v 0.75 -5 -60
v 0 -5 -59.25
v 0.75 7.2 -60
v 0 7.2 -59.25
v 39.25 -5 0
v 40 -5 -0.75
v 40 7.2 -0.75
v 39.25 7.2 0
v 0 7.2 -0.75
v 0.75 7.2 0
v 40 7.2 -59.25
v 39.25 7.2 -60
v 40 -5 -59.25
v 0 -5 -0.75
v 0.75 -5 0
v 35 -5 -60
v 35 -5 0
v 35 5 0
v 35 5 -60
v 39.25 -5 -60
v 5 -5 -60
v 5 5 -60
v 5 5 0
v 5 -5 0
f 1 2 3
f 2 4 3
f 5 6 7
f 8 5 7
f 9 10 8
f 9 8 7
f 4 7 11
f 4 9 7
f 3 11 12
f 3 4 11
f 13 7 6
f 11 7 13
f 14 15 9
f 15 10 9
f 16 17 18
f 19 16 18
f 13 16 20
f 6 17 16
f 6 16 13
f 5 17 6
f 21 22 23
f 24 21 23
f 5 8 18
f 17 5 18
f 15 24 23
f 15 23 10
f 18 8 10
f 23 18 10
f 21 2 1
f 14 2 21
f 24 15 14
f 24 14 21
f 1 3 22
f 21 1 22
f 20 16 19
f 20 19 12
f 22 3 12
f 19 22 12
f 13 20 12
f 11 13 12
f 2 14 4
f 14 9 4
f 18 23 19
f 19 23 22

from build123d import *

# Parameters (mm, degrees)
SCHIZZO1_W                        = 60
SCHIZZO1_H                        = 7.2
SCHIZZO1_W_2                      = 19.125
SCHIZZO1_H_2                      = 5
ESTRUSIONE_ESTRUSIONE1_DEPTH      = 40
SCHIZZO2_W                        = 11.375
SCHIZZO2_H                        = 5
SCHIZZO2_W_2                      = 2.075
SCHIZZO2_H_2                      = 1.1
SCHIZZO2_W_3                      = 2.05
TAGLIO_ESTRUSIONE1_DEPTH          = 61
SMUSSO1_SIZE                      = 0.75
SCHIZZO3_W                        = 7.25
SCHIZZO3_H                        = 5
TAGLIO_ESTRUSIONE2_DEPTH          = 64
SCHIZZO4_W                        = 38.5
SCHIZZO4_H                        = 1.1
ESTRUSIONE_ESTRUSIONE3_DEPTH      = 60
SCHIZZO7_W                        = 30
SCHIZZO7_H                        = 1.1
ESTRUSIONE_ESTRUSIONE4_DEPTH      = 50
ESTRUSIONE_ESTRUSIONE5_DEPTH      = 5
SCHIZZO9_W                        = 19.125
SCHIZZO9_H                        = 1.1
ESTRUSIONE_ESTRUSIONE6_DEPTH      = 5
ESTRUSIONE_ESTRUSIONE6_DEPTH_BACK = 35
SCHIZZO10_W                       = 19.125
SCHIZZO10_H                       = 3.9
TAGLIO_ESTRUSIONE3_DEPTH          = 41
SCHIZZO11_W                       = 19.125
SCHIZZO11_H                       = 7.8
ESTRUSIONE_ESTRUSIONE7_DEPTH      = 40
SCHIZZO12_W                       = 30
SCHIZZO12_H                       = 10
TAGLIO_ESTRUSIONE4_DEPTH          = 64


with BuildPart() as part:
    # Schizzo1 → Estrusione-Estrusione1 (new body)
    with BuildSketch(Plane(origin=(0, 0, 0), x_dir=(0, 0, -1), z_dir=(1, 0, 0))):
        with Locations((30, 3.6)):
            Rectangle(SCHIZZO1_W, SCHIZZO1_H)
        with Locations((43.1875, 3.6)):
            Rectangle(SCHIZZO1_W_2, SCHIZZO1_H_2, mode=Mode.SUBTRACT)
        with Locations((16.8125, 3.6)):
            Rectangle(SCHIZZO1_W_2, SCHIZZO1_H_2, mode=Mode.SUBTRACT)
    extrude(amount=ESTRUSIONE_ESTRUSIONE1_DEPTH)

    # Schizzo2 → Taglio-Estrusione1 (cut, through all)
    with BuildSketch(Plane.XY):
        with Locations((10.6875, 2.5)):
            Rectangle(SCHIZZO2_W, SCHIZZO2_H)
        with Locations((29.3125, 2.5)):
            Rectangle(SCHIZZO2_W, SCHIZZO2_H)
        with Locations((15.3375, 6.65)):
            Rectangle(SCHIZZO2_W_2, SCHIZZO2_H_2)
        with Locations((8.275, 6.65)):
            Rectangle(SCHIZZO2_W_3, SCHIZZO2_H_2)
        with Locations((24.6625, 6.65)):
            Rectangle(SCHIZZO2_W_2, SCHIZZO2_H_2)
        with Locations((31.725, 6.65)):
            Rectangle(SCHIZZO2_W_3, SCHIZZO2_H_2)
    extrude(amount=-TAGLIO_ESTRUSIONE1_DEPTH, mode=Mode.SUBTRACT)

    # Smusso1
    smusso1_edges = [part.edges().sort_by_distance(p)[0] for p in [
        (40, 3.6, 0),
        (0, 3.6, 0),
        (0, 3.6, -60),
        (40, 3.6, -60),
    ]]
    chamfer(smusso1_edges, length=SMUSSO1_SIZE)

    # Schizzo3 → Taglio-Estrusione2 (cut)
    with BuildSketch(Plane.XY):
        with Locations((20, 2.5)):
            Rectangle(SCHIZZO3_W, SCHIZZO3_H)
    extrude(amount=-TAGLIO_ESTRUSIONE2_DEPTH, mode=Mode.SUBTRACT)

    # Schizzo4 → Estrusione-Estrusione3 (add)
    with BuildSketch(Plane.XY):
        with Locations((20, 6.65)):
            Rectangle(SCHIZZO4_W, SCHIZZO4_H)
    extrude(amount=-ESTRUSIONE_ESTRUSIONE3_DEPTH)

    # Schizzo7 → Estrusione-Estrusione4 (add)
    with BuildSketch(Plane.XY.offset(-52.75)):
        with Locations((20, 5.55)):
            Rectangle(SCHIZZO7_W, SCHIZZO7_H)
    extrude(amount=ESTRUSIONE_ESTRUSIONE4_DEPTH)

    # Schizzo8 → Estrusione-Estrusione5 (add)
    with BuildSketch(Plane.XZ):
        Polygon((5, 0), (0.75, 0), (0, -0.75), (0, -59.25), (0.75, -60), (5, -60), align=None)
        Polygon((35, 0), (35, -60), (39.25, -60), (40, -59.25), (40, -0.75), (39.25, 0), align=None)
    extrude(amount=ESTRUSIONE_ESTRUSIONE5_DEPTH)

    # Schizzo9 → Estrusione-Estrusione6 (add, two sides)
    with BuildSketch(Plane(origin=(35, 0, 0), x_dir=(0, 0, -1), z_dir=(1, 0, 0))) as estrusione_estrusione6_sk:
        with Locations((16.8125, 5.55)):
            Rectangle(SCHIZZO9_W, SCHIZZO9_H)
        with Locations((43.1875, 5.55)):
            Rectangle(SCHIZZO9_W, SCHIZZO9_H)
    extrude(amount=ESTRUSIONE_ESTRUSIONE6_DEPTH)
    extrude(estrusione_estrusione6_sk.sketch, amount=-ESTRUSIONE_ESTRUSIONE6_DEPTH_BACK)

    # Schizzo10 → Taglio-Estrusione3 (cut, through all)
    with BuildSketch(Plane.ZY):
        with Locations((-43.1875, -0.85)):
            Rectangle(SCHIZZO10_W, SCHIZZO10_H)
        with Locations((-16.8125, -0.85)):
            Rectangle(SCHIZZO10_W, SCHIZZO10_H)
    extrude(amount=-TAGLIO_ESTRUSIONE3_DEPTH, mode=Mode.SUBTRACT)

    # Schizzo11 → Estrusione-Estrusione7 (add)
    with BuildSketch(Plane.ZY):
        with Locations((-43.1875, 1.1)):
            Rectangle(SCHIZZO11_W, SCHIZZO11_H)
        with Locations((-16.8125, 1.1)):
            Rectangle(SCHIZZO11_W, SCHIZZO11_H)
    extrude(amount=-ESTRUSIONE_ESTRUSIONE7_DEPTH)

    # Schizzo12 → Taglio-Estrusione4 (cut)
    with BuildSketch(Plane(origin=(0, 0, -60), x_dir=(-1, 0, 0), z_dir=(0, 0, -1))):
        with Locations((-20, 0)):
            Rectangle(SCHIZZO12_W, SCHIZZO12_H)
    extrude(amount=-TAGLIO_ESTRUSIONE4_DEPTH, mode=Mode.SUBTRACT)


solid = part.part
